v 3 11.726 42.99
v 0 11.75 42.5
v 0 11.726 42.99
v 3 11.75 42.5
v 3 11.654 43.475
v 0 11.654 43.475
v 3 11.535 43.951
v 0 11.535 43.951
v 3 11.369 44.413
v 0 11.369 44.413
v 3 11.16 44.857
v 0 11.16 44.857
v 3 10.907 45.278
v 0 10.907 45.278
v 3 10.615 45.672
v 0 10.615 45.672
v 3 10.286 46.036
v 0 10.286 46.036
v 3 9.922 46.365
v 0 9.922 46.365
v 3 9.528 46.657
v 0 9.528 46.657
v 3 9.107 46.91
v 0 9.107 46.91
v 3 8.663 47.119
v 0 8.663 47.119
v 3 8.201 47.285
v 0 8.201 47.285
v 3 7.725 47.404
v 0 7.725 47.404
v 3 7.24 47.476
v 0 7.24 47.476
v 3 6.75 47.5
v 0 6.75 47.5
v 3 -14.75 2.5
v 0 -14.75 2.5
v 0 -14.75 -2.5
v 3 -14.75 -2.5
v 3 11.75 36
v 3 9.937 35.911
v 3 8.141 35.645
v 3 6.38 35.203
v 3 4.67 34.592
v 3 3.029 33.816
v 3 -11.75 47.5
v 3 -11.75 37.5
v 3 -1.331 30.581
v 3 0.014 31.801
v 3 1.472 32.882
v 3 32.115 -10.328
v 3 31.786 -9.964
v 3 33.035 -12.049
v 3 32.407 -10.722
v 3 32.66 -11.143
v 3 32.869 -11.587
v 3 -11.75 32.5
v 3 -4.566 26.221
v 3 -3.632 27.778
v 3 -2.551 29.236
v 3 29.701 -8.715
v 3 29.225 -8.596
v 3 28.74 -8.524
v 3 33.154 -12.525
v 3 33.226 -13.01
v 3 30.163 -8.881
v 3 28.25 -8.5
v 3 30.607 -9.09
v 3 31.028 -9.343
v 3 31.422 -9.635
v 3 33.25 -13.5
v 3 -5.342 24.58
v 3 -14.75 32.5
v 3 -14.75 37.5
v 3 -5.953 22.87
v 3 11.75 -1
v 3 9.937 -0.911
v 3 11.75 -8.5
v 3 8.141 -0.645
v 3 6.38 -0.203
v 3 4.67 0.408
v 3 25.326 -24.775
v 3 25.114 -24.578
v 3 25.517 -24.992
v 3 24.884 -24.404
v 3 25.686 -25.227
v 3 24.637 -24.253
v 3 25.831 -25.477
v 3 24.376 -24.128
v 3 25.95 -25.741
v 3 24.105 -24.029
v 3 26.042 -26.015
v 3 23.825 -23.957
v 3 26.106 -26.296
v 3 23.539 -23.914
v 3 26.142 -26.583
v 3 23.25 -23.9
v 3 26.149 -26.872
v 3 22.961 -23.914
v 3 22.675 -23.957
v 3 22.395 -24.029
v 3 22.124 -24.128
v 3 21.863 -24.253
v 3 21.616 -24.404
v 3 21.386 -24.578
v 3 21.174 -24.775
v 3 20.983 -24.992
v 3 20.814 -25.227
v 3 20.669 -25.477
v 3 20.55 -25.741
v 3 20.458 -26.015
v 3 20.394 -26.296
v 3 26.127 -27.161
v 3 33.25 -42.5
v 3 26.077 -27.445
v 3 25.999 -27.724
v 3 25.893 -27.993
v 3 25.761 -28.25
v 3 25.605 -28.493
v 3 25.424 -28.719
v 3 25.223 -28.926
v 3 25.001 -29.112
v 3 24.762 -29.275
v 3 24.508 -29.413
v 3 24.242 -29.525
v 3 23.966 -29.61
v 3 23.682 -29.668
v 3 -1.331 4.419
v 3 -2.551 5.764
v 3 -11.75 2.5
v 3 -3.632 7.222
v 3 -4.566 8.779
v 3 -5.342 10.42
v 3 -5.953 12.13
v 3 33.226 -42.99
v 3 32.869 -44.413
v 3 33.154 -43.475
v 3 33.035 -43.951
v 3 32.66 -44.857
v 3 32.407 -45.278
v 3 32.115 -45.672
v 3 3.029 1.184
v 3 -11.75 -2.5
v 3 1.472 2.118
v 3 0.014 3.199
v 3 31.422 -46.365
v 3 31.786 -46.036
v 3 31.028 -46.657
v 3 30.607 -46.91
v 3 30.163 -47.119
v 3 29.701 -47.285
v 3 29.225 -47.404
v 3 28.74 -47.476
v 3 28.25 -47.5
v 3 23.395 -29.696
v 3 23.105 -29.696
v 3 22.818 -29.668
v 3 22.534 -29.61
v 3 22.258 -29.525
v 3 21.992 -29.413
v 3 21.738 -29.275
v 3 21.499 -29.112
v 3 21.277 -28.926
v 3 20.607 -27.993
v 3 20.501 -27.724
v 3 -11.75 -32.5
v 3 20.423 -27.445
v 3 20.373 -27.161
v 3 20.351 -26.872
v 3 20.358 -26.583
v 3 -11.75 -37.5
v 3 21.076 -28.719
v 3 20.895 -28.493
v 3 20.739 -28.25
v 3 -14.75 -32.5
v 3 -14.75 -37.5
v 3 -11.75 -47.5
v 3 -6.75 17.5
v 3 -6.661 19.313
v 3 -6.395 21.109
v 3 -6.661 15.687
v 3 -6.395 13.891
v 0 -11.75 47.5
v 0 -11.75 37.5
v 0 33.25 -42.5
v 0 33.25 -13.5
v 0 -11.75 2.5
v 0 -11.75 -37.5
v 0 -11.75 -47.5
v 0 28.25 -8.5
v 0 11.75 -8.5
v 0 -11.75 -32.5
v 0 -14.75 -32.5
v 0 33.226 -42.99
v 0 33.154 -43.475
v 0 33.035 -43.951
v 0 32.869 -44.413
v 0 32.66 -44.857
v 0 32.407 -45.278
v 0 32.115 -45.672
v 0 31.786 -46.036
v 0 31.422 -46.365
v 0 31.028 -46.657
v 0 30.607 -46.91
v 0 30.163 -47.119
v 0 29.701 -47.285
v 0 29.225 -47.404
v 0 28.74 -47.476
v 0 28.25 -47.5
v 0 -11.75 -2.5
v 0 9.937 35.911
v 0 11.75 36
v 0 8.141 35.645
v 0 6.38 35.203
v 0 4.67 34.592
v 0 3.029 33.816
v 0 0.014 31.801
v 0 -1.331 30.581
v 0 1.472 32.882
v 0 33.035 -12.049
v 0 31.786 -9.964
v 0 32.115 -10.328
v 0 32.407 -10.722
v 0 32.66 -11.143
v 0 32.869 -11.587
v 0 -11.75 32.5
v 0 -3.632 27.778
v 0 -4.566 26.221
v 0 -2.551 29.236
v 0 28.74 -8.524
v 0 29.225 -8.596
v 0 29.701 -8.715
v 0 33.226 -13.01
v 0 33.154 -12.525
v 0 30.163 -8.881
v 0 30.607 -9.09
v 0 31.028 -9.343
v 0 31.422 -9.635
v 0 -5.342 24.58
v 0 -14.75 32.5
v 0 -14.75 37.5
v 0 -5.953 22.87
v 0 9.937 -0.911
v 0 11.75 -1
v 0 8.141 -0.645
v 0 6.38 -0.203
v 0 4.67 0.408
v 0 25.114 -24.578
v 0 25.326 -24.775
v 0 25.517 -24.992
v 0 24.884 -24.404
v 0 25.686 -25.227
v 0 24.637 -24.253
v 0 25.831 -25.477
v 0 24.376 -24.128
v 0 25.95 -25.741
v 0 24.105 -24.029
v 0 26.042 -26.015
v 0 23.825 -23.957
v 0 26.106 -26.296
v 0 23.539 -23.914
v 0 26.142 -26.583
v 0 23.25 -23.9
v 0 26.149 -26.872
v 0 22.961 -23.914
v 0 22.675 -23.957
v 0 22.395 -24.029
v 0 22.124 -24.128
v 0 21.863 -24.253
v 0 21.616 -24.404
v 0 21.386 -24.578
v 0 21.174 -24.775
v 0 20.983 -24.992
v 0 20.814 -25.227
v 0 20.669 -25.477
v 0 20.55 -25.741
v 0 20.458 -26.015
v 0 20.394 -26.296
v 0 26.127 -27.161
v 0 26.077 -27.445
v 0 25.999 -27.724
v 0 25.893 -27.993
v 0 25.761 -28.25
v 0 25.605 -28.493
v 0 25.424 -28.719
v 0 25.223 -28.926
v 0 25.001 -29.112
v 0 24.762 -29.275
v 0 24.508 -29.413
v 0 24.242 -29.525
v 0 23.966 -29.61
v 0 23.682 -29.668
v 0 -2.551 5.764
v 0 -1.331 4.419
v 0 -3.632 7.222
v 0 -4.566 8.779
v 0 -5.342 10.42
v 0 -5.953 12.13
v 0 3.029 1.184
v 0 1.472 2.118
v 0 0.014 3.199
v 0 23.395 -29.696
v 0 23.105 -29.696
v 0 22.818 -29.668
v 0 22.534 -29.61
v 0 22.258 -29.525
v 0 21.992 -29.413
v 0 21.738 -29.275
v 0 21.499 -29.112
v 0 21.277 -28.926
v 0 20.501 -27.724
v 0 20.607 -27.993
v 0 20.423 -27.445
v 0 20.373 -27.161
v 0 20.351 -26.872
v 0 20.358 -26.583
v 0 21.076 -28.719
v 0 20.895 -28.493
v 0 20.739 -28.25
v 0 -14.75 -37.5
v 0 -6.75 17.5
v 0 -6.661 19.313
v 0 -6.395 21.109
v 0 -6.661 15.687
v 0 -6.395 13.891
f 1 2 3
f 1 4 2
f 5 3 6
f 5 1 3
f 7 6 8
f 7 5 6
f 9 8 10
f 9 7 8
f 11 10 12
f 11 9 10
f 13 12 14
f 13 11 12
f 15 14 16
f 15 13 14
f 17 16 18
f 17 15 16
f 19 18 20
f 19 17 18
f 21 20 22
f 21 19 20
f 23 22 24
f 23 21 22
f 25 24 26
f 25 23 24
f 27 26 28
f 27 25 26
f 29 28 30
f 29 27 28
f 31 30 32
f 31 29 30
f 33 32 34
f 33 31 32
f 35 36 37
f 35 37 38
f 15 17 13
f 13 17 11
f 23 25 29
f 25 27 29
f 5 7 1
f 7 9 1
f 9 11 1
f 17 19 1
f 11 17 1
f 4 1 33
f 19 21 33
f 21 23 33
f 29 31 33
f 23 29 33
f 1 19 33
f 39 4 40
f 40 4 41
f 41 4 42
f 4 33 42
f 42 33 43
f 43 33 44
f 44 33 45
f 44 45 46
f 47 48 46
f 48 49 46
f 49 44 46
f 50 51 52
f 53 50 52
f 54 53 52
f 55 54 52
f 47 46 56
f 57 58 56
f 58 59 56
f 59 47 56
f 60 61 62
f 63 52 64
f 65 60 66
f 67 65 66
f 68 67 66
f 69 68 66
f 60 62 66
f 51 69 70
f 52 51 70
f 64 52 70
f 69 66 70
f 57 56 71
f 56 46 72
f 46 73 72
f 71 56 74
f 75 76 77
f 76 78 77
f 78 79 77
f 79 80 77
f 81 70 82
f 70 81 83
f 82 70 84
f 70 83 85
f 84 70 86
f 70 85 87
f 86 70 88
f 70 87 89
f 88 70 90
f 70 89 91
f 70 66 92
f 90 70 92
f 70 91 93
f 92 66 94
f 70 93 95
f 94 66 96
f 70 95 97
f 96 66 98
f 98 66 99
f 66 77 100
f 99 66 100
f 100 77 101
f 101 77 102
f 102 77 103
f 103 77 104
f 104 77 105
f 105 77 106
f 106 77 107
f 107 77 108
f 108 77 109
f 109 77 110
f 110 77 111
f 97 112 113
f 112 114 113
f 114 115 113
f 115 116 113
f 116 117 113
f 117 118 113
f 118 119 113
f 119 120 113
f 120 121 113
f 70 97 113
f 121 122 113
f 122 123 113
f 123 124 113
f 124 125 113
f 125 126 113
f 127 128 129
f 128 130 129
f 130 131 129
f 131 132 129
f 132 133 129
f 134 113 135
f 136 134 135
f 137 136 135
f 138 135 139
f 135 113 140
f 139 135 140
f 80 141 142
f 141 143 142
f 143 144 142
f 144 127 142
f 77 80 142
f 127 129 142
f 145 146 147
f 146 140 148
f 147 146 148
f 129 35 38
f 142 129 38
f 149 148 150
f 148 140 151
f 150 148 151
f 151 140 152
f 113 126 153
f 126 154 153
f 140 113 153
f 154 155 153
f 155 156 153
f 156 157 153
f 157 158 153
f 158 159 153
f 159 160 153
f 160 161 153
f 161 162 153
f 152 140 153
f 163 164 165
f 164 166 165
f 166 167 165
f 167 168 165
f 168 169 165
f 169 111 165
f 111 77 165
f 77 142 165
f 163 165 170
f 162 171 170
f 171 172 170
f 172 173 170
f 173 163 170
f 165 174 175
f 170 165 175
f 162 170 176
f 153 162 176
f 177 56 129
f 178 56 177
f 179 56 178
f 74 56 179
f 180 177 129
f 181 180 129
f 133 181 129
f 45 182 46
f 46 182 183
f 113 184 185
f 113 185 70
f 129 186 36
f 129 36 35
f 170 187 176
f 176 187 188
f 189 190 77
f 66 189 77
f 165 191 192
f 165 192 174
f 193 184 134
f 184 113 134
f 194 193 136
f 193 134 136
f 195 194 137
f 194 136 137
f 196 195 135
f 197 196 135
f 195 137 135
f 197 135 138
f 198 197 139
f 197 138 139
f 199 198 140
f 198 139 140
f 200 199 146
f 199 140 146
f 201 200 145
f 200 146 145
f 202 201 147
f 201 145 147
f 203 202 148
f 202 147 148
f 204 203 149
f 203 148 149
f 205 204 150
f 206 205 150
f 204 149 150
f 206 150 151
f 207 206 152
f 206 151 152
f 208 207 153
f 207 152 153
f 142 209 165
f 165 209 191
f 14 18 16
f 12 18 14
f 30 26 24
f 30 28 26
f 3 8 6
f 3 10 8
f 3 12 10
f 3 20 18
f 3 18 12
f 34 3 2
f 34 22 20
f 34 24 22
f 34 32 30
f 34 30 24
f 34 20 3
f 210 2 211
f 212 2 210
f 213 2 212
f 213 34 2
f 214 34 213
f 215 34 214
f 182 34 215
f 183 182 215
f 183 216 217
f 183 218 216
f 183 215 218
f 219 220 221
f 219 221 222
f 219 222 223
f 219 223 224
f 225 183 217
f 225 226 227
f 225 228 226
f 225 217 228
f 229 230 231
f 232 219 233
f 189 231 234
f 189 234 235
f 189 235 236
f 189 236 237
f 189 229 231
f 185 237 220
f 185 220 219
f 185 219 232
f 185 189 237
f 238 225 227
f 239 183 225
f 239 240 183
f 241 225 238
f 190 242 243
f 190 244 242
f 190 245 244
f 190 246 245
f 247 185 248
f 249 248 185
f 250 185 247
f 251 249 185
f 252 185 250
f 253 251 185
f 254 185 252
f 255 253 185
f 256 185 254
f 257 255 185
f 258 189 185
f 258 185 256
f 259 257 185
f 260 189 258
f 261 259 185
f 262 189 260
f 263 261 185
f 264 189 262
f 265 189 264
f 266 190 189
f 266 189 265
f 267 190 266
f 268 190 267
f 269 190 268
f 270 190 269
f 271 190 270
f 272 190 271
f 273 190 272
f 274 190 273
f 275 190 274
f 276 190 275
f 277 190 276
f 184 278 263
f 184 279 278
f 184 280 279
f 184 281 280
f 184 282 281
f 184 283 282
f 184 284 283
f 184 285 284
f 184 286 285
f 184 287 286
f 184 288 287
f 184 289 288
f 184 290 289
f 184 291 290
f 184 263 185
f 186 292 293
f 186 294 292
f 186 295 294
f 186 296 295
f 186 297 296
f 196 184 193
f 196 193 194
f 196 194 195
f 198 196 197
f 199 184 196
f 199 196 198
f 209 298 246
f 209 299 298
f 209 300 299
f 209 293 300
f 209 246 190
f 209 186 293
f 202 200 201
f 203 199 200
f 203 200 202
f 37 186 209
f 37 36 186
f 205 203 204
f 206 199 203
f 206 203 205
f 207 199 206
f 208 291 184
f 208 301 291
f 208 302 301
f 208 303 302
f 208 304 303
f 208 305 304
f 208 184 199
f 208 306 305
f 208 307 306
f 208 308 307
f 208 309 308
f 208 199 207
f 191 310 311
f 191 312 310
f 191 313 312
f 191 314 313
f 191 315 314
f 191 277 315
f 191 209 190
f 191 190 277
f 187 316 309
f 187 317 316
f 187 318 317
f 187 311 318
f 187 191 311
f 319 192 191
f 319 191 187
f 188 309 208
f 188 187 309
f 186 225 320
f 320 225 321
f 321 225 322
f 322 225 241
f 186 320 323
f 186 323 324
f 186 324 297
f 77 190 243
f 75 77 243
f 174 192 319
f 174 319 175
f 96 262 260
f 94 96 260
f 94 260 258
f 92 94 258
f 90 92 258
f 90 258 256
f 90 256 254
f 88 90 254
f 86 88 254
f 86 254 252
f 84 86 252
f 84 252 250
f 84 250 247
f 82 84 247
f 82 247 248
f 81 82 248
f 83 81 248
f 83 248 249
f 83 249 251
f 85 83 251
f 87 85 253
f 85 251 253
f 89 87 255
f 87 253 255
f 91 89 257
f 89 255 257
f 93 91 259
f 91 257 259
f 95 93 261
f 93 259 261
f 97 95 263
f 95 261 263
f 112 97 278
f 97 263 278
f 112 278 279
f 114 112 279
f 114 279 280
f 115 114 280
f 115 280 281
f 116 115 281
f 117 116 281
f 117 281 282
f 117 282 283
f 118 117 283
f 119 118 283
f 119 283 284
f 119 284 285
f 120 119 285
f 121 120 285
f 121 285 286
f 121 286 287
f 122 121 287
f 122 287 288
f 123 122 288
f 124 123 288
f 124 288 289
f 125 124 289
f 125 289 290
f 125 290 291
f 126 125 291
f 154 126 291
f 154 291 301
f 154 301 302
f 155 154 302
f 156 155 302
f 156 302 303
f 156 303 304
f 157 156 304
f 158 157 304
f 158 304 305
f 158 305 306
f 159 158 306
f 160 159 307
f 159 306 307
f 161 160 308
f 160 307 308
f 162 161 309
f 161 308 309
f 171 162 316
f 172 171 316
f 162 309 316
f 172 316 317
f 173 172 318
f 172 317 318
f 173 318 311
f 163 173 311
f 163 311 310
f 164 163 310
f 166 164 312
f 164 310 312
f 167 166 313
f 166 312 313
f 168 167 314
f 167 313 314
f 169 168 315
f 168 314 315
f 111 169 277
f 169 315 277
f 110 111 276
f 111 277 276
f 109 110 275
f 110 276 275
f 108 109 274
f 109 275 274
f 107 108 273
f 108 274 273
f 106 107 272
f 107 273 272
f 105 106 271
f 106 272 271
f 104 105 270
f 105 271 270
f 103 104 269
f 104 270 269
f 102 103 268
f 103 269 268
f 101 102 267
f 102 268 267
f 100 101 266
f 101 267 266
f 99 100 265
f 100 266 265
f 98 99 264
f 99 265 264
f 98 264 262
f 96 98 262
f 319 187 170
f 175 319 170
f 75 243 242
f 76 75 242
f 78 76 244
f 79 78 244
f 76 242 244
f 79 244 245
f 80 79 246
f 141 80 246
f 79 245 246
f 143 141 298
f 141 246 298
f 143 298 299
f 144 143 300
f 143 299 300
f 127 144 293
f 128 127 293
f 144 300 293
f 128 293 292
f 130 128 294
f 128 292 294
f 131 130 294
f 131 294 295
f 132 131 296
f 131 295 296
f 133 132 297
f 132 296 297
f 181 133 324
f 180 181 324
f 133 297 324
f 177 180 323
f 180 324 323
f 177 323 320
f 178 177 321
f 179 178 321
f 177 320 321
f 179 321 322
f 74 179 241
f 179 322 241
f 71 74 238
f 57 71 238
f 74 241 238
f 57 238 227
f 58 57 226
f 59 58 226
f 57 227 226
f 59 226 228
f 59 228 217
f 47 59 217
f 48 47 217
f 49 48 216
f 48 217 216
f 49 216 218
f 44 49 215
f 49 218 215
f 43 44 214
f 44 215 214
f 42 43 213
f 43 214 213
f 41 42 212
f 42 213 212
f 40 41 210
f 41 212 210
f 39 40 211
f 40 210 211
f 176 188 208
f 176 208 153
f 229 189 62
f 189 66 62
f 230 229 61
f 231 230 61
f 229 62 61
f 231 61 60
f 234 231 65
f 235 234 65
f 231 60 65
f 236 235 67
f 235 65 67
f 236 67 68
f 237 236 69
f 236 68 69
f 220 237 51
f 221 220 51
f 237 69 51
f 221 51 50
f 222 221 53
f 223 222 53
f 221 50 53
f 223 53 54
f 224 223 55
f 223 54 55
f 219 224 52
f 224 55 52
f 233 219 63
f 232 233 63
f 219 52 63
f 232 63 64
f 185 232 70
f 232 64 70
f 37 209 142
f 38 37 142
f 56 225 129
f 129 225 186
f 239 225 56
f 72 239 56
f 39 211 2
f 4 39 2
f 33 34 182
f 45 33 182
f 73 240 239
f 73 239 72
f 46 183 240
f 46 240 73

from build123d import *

# Parameters (mm, degrees)
BOSS_EXTRUDE1_DEPTH = 3
SKETCH3_W           = 3
SKETCH3_H           = 5
BOSS_EXTRUDE2_DEPTH = 3
SKETCH5_W           = 3
SKETCH5_H           = 39
BOSS_EXTRUDE3_DEPTH = 21.5
CUT_EXTRUDE3_DEPTH  = 4
FILLET1_R           = 5


with BuildPart() as part:
    # Sketch1 → Boss-Extrude1 (new body)
    with BuildSketch(Plane(origin=(0, 0, 0), x_dir=(0, 0, -1), z_dir=(1, 0, 0))):
        with BuildLine():
            Line((-36, 11.75), (-47.5, 11.75))
            Line((-47.5, 11.75), (-47.5, -11.75))
            Line((-47.5, -11.75), (47.5, -11.75))
            Line((47.5, -11.75), (47.5, 11.75))
            Line((47.5, 11.75), (1, 11.75))
            ThreePointArc((1, 11.75), (-17.5, -6.75), (-36, 11.75))
        make_face()
    extrude(amount=BOSS_EXTRUDE1_DEPTH)

    # Sketch3 → Boss-Extrude2 (add)
    with BuildSketch(Plane.XZ.offset(11.75)):
        with Locations((1.5, -35)):
            Rectangle(SKETCH3_W, SKETCH3_H)
        with Locations((1.5, 0)):
            Rectangle(SKETCH3_W, SKETCH3_H)
        with Locations((1.5, 35)):
            Rectangle(SKETCH3_W, SKETCH3_H)
    extrude(amount=BOSS_EXTRUDE2_DEPTH)

    # Sketch5 → Boss-Extrude3 (add)
    with BuildSketch(Plane(origin=(0, 11.75, 0), x_dir=(1, 0, 0), z_dir=(0, 1, 0))):
        with Locations((1.5, 28)):
            Rectangle(SKETCH5_W, SKETCH5_H)
    extrude(amount=BOSS_EXTRUDE3_DEPTH)

    # Sketch7 → Cut-Extrude3 (cut, through all)
    with BuildSketch(Plane.ZY):
        with BuildLine():
            ThreePointArc((-29.7, 23.25), (-26.8, 20.35), (-23.9, 23.25))
            ThreePointArc((-23.9, 23.25), (-26.8, 26.15), (-29.7, 23.25))
        make_face()
    extrude(amount=-CUT_EXTRUDE3_DEPTH, mode=Mode.SUBTRACT)

    # Fillet1
    fillet1_edges = [part.edges().sort_by_distance(p)[0] for p in [
        (1.5, 11.75, 47.5),
        (1.5, 33.25, -47.5),
        (1.5, 33.25, -8.5),
    ]]
    fillet(fillet1_edges, radius=FILLET1_R)


solid = part.part
